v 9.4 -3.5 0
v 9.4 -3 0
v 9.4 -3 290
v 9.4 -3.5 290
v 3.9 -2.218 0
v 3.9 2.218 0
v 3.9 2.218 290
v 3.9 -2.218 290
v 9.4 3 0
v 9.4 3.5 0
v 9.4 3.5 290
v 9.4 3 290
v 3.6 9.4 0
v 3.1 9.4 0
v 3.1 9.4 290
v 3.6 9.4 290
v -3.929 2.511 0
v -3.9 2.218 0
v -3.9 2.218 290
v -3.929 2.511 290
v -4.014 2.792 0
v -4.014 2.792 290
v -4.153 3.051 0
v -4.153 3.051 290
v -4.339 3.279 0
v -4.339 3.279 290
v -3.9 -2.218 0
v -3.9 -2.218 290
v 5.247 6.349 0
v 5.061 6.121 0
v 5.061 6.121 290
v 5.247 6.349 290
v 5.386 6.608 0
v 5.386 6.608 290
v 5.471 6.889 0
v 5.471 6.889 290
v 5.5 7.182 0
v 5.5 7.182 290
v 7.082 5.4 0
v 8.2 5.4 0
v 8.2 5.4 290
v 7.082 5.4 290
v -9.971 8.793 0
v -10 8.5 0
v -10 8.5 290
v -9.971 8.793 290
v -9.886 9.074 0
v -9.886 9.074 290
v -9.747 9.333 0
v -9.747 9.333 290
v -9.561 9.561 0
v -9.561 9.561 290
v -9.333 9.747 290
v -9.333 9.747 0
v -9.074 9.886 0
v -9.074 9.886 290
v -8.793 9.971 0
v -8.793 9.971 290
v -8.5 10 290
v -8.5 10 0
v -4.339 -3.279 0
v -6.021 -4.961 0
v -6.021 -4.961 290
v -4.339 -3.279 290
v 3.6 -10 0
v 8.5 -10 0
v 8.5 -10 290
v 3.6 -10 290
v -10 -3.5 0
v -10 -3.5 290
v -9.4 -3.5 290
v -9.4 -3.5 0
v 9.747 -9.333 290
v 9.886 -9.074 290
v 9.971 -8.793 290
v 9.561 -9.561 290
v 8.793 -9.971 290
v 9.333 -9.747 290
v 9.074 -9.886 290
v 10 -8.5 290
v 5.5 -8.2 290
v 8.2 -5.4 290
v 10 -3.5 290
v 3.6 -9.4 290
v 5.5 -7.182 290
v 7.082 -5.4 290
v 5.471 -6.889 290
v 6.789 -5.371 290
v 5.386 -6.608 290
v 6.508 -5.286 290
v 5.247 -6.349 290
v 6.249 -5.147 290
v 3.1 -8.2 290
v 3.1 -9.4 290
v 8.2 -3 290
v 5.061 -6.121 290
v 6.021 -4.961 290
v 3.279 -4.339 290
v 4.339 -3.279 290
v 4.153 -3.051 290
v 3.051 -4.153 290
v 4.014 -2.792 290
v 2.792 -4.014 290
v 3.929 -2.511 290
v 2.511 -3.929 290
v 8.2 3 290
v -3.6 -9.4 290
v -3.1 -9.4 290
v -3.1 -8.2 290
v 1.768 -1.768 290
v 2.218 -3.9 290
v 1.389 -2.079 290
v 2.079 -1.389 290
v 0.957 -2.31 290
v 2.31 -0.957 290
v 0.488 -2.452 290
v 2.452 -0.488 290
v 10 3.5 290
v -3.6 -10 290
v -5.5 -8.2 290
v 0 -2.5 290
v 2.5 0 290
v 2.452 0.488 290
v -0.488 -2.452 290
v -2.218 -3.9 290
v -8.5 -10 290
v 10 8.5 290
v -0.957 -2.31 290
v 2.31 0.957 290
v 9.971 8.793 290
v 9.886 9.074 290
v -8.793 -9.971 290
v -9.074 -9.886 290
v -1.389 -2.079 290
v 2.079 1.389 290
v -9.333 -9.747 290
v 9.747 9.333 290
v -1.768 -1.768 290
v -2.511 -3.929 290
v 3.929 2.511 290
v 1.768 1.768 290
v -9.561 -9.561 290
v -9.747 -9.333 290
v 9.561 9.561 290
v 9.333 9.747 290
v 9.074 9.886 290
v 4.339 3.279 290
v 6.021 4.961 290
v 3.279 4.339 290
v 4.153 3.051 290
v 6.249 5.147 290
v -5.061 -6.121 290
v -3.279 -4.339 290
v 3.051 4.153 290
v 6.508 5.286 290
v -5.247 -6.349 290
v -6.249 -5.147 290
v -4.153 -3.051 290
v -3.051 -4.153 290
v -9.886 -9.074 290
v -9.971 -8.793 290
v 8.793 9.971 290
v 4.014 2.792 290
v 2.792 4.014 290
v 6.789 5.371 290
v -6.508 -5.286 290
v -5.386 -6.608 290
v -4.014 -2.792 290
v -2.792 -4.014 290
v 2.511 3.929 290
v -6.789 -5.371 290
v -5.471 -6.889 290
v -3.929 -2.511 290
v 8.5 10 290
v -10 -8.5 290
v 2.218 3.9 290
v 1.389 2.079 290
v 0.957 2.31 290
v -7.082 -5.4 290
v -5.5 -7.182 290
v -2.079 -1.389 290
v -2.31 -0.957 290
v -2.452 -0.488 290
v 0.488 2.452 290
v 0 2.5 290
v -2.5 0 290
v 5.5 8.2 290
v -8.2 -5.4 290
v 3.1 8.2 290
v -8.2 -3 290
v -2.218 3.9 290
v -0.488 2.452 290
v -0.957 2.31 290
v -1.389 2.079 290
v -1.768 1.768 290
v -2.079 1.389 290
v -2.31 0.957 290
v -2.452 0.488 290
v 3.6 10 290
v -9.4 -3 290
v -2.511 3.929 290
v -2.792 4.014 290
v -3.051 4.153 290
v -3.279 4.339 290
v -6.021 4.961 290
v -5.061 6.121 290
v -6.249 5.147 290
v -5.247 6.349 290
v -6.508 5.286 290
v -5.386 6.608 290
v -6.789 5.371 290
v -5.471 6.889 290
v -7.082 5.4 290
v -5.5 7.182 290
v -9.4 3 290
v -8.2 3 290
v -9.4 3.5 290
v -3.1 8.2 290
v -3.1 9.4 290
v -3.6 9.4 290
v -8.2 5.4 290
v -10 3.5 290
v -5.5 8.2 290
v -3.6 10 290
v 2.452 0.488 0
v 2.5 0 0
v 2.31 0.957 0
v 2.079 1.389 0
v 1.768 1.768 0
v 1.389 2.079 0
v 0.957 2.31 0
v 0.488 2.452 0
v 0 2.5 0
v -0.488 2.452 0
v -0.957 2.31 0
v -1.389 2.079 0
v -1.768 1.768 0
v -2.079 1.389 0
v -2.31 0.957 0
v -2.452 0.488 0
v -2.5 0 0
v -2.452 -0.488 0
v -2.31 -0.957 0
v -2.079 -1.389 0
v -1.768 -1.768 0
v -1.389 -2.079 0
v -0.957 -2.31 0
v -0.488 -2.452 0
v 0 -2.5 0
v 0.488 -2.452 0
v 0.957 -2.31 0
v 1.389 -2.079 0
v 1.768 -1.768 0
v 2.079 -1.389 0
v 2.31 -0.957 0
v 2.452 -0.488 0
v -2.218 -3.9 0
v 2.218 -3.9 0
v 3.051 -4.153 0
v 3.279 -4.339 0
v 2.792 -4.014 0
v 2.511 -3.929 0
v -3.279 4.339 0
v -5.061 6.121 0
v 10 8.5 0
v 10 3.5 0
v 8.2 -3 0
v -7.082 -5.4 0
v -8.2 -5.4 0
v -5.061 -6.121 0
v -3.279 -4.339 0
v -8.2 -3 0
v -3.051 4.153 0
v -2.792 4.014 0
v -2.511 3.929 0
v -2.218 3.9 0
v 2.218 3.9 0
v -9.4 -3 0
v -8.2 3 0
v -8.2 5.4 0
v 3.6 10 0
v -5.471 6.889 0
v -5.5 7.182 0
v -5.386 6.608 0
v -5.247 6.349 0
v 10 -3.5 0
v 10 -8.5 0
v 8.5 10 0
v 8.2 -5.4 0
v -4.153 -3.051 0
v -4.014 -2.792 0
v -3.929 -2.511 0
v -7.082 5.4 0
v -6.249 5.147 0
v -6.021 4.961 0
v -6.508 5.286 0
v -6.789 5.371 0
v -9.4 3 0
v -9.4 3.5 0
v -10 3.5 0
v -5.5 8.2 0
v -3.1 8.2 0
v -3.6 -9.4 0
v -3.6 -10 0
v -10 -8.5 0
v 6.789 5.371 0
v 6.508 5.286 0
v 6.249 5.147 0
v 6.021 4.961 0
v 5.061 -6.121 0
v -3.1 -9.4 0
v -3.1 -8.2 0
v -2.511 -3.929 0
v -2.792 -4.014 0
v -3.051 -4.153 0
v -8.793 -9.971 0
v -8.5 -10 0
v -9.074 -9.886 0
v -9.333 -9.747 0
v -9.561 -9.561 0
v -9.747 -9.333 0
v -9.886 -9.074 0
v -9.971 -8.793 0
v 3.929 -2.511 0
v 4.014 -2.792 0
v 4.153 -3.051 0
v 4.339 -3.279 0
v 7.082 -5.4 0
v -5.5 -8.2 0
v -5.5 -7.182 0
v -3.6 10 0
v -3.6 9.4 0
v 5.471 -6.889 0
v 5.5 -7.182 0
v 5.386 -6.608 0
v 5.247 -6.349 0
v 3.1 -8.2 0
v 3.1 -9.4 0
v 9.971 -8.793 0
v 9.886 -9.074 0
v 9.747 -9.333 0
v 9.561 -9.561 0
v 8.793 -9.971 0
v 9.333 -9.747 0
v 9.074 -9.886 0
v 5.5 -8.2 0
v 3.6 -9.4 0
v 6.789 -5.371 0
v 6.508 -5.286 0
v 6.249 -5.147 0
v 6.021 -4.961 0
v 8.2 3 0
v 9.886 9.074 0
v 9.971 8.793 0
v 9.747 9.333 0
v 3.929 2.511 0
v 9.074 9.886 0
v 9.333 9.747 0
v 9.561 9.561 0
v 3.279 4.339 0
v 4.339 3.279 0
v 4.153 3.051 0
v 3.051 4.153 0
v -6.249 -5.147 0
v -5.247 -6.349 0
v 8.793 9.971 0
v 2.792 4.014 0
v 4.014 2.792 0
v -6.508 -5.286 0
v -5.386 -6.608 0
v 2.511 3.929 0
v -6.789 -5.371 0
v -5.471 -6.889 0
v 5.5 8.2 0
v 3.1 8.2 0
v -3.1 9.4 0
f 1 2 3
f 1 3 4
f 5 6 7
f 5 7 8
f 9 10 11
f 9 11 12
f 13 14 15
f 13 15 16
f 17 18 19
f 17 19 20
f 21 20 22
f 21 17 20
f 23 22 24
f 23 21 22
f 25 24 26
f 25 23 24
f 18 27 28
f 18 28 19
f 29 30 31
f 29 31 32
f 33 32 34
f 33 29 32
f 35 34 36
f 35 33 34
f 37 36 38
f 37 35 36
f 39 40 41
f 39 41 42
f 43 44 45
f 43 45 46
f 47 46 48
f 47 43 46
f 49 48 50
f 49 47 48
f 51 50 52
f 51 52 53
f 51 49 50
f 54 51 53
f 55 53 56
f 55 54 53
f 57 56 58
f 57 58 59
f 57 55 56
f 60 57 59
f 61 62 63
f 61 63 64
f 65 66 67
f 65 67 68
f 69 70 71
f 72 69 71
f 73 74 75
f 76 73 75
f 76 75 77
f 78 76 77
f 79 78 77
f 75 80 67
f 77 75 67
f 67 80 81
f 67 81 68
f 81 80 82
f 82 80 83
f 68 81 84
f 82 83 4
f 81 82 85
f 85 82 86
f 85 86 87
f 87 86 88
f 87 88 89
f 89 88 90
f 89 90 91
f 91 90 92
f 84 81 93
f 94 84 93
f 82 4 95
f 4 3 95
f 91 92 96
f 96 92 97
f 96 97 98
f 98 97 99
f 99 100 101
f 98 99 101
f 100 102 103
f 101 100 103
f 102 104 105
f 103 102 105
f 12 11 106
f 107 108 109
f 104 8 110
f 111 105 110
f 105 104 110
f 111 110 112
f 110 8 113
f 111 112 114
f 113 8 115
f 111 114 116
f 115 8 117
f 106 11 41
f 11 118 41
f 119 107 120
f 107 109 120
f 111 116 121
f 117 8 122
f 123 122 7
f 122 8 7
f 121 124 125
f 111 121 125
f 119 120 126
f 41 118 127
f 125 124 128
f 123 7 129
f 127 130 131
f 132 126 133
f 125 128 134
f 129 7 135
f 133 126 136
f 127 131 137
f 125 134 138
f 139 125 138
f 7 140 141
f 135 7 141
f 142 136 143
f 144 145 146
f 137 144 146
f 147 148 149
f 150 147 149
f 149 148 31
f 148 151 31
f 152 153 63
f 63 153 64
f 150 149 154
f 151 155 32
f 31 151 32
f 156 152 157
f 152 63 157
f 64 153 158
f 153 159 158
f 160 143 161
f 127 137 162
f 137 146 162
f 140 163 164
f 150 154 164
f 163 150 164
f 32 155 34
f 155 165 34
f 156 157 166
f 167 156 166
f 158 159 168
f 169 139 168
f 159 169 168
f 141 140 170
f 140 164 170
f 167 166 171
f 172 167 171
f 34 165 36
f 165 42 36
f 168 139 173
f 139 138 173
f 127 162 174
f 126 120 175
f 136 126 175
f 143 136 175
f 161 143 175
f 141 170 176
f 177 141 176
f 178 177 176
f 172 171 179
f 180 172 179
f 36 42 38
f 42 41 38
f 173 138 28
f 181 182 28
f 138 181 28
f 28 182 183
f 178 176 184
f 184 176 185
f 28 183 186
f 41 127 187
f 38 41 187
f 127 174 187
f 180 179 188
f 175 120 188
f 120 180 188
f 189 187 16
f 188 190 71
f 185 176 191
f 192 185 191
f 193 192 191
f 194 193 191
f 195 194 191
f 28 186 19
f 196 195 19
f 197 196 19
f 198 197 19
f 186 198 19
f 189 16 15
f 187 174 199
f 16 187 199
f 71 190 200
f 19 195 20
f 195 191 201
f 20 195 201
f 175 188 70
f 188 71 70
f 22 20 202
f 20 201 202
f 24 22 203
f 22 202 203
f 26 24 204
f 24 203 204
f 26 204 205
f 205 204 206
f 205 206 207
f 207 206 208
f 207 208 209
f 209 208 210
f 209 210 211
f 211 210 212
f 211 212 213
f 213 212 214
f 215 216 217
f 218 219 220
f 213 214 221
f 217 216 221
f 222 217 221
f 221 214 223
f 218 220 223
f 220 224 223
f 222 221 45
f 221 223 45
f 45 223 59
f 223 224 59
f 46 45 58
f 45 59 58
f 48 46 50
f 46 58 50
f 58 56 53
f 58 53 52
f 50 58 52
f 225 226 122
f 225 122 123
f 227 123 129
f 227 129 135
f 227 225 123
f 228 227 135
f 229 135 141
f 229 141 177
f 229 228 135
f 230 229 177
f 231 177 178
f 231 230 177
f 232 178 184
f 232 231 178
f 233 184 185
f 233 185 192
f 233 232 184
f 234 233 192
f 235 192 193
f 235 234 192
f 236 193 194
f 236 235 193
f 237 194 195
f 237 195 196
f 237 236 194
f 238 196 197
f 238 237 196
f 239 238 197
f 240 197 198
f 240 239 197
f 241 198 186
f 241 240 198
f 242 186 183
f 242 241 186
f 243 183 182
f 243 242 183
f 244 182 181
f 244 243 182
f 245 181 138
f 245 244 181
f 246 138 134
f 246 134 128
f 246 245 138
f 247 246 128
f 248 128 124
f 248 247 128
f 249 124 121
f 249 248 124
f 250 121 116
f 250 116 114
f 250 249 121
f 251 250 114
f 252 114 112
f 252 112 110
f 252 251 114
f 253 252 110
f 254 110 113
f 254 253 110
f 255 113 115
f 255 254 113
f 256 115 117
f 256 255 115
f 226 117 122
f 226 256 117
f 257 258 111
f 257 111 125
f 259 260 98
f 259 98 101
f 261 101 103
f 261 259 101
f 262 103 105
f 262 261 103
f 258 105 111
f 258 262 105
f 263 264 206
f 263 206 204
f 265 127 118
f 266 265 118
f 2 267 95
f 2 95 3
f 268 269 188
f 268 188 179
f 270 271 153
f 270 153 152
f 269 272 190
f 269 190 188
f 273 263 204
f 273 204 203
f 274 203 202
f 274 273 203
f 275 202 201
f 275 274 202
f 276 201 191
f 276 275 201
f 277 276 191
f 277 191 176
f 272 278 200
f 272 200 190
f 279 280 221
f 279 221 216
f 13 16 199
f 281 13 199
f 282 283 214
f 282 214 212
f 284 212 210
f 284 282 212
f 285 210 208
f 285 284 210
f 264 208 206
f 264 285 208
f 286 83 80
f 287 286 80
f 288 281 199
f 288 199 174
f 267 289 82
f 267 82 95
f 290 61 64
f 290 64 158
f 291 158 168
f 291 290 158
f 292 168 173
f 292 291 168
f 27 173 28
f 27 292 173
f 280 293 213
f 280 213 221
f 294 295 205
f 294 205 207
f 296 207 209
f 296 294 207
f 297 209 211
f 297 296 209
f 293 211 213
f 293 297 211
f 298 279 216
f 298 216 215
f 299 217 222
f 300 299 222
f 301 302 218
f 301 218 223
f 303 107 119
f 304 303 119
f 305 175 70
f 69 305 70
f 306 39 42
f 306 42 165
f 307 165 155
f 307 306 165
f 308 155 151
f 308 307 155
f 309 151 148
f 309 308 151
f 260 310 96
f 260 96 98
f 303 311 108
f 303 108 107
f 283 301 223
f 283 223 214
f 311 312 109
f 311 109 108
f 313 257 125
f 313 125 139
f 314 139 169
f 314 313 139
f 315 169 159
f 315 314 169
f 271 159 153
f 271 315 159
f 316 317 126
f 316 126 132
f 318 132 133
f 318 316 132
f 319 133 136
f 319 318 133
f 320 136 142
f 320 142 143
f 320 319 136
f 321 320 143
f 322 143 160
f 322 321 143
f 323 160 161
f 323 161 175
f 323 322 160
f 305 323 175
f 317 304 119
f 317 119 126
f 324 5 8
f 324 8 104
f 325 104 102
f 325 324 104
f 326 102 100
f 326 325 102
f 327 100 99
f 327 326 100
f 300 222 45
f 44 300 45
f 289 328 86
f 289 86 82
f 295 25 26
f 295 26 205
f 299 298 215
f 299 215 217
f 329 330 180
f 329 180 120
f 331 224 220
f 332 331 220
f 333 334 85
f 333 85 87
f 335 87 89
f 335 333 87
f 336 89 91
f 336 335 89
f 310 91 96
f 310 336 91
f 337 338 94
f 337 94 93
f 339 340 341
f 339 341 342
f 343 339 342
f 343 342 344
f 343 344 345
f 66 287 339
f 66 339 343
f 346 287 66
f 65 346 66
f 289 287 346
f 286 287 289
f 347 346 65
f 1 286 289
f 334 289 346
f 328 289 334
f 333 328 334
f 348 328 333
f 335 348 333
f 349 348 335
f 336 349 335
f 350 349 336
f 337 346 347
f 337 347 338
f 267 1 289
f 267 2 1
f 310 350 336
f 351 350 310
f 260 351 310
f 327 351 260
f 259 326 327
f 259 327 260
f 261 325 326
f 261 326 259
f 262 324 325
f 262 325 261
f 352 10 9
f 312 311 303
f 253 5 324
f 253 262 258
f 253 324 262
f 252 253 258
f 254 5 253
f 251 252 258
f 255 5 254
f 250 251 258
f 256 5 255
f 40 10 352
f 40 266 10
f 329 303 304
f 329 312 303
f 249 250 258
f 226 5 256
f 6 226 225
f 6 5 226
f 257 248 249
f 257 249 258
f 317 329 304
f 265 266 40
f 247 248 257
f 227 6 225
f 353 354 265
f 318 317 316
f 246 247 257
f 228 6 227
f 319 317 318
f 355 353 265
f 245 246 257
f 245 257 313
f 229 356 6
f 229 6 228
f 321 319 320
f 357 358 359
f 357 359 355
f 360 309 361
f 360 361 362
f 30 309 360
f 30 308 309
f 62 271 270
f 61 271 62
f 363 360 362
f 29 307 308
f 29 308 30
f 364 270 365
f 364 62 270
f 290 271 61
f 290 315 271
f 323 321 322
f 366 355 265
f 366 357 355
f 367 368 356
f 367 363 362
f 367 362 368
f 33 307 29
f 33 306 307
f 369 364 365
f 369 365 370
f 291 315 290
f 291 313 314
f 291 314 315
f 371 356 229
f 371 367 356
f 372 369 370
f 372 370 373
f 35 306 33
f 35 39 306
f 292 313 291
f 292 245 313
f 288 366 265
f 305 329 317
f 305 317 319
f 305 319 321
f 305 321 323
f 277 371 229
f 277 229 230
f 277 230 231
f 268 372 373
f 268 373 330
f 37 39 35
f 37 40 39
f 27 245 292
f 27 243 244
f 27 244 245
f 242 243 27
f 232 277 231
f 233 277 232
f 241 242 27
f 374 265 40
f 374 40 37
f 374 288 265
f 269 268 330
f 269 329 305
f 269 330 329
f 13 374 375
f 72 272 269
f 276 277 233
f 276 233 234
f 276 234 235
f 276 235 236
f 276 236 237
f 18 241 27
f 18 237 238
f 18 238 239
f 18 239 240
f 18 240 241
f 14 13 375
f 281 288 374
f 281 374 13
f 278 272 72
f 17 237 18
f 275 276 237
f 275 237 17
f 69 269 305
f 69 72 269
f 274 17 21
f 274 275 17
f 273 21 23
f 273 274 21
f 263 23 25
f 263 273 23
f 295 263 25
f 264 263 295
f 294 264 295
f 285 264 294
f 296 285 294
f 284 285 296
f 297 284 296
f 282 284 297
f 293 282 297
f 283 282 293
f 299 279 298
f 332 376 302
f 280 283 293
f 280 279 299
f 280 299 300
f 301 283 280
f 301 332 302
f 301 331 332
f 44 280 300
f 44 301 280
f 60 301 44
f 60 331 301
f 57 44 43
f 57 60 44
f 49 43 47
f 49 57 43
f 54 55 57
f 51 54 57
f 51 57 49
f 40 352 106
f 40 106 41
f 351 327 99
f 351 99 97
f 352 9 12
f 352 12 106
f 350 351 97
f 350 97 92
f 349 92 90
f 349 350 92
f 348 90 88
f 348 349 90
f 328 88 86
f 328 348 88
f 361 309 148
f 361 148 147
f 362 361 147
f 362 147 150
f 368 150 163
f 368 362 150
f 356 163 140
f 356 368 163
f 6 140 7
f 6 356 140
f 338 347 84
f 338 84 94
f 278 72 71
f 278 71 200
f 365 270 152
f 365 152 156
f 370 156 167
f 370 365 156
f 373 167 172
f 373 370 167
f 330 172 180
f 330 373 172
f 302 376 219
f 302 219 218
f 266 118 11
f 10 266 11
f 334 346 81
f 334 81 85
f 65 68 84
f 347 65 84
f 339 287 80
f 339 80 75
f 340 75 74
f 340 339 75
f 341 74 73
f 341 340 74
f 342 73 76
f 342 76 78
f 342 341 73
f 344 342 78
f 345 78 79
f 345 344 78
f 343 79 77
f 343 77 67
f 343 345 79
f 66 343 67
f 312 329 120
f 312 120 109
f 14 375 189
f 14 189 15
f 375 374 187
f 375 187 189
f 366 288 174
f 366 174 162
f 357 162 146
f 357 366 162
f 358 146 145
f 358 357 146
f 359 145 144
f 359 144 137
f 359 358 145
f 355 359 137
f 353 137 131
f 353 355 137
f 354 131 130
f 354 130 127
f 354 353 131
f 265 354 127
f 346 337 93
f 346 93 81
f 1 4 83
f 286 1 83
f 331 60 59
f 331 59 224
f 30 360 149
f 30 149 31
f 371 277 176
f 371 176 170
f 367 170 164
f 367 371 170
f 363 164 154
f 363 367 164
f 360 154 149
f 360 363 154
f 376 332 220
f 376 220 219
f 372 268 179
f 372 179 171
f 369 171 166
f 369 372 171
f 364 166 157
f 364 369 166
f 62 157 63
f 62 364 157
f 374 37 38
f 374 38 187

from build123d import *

# Parameters (mm, degrees)
SKETCH1_R           = 2.5
BOSS_EXTRUDE1_DEPTH = 290


with BuildPart() as part:
    # Sketch1 → Boss-Extrude1 (new body)
    with BuildSketch(Plane.XY):
        with BuildLine():
            Line((-3.6, -10), (-8.5, -10))
            ThreePointArc((-8.5, -10), (-9.560660172, -9.560660172), (-10, -8.5))
            Line((-10, -8.5), (-10, -3.5))
            Line((-10, -3.5), (-9.4, -3.5))
            Line((-9.4, -3.5), (-9.4, -3))
            Line((-9.4, -3), (-8.2, -3))
            Line((-8.2, -3), (-8.2, -5.4))
            Line((-8.2, -5.4), (-7.081980515, -5.4))
            ThreePointArc((-7.081980515, -5.4), (-6.507955367, -5.285819299), (-6.021320344, -4.960660172))
            Line((-6.021320344, -4.960660172), (-4.339339828, -3.278679656))
            ThreePointArc((-4.339339828, -3.278679656), (-4.014180701, -2.792044633), (-3.9, -2.218019485))
            Line((-3.9, -2.218019485), (-3.9, 2.218019485))
            ThreePointArc((-3.9, 2.218019485), (-4.014180701, 2.792044633), (-4.339339828, 3.278679656))
            Line((-4.339339828, 3.278679656), (-6.021320344, 4.960660172))
            ThreePointArc((-6.021320344, 4.960660172), (-6.507955367, 5.285819299), (-7.081980515, 5.4))
            Line((-7.081980515, 5.4), (-8.2, 5.4))
            Line((-8.2, 5.4), (-8.2, 3))
            Line((-8.2, 3), (-9.4, 3))
            Line((-9.4, 3), (-9.4, 3.5))
            Line((-9.4, 3.5), (-10, 3.5))
            Line((-10, 3.5), (-10, 8.5))
            ThreePointArc((-10, 8.5), (-9.560660172, 9.560660172), (-8.5, 10))
            Line((-8.5, 10), (-3.6, 10))
            Line((-3.6, 10), (-3.6, 9.4))
            Line((-3.6, 9.4), (-3.1, 9.4))
            Line((-3.1, 9.4), (-3.1, 8.2))
            Line((-3.1, 8.2), (-5.5, 8.2))
            Line((-5.5, 8.2), (-5.5, 7.181980515))
            ThreePointArc((-5.5, 7.181980515), (-5.385819299, 6.607955367), (-5.060660172, 6.121320344))
            Line((-5.060660172, 6.121320344), (-3.278679656, 4.339339828))
            ThreePointArc((-3.278679656, 4.339339828), (-2.792044633, 4.014180701), (-2.218019485, 3.9))
            Line((-2.218019485, 3.9), (2.218019485, 3.9))
            ThreePointArc((2.218019485, 3.9), (2.792044633, 4.014180701), (3.278679656, 4.339339828))
            Line((3.278679656, 4.339339828), (5.060660172, 6.121320344))
            ThreePointArc((5.060660172, 6.121320344), (5.385819299, 6.607955367), (5.5, 7.181980515))
            Line((5.5, 7.181980515), (5.5, 8.2))
            Line((5.5, 8.2), (3.1, 8.2))
            Line((3.1, 8.2), (3.1, 9.4))
            Line((3.1, 9.4), (3.6, 9.4))
            Line((3.6, 9.4), (3.6, 10))
            Line((3.6, 10), (8.5, 10))
            ThreePointArc((8.5, 10), (9.560660172, 9.560660172), (10, 8.5))
            Line((10, 8.5), (10, 3.5))
            Line((10, 3.5), (9.4, 3.5))
            Line((9.4, 3.5), (9.4, 3))
            Line((9.4, 3), (8.2, 3))
            Line((8.2, 3), (8.2, 5.4))
            Line((8.2, 5.4), (7.081980515, 5.4))
            ThreePointArc((7.081980515, 5.4), (6.507955367, 5.285819299), (6.021320344, 4.960660172))
            Line((6.021320344, 4.960660172), (4.339339828, 3.278679656))
            ThreePointArc((4.339339828, 3.278679656), (4.014180701, 2.792044633), (3.9, 2.218019485))
            Line((3.9, 2.218019485), (3.9, -2.218019485))
            ThreePointArc((3.9, -2.218019485), (4.014180701, -2.792044633), (4.339339828, -3.278679656))
            Line((4.339339828, -3.278679656), (6.021320344, -4.960660172))
            ThreePointArc((6.021320344, -4.960660172), (6.507955367, -5.285819299), (7.081980515, -5.4))
            Line((7.081980515, -5.4), (8.2, -5.4))
            Line((8.2, -5.4), (8.2, -3))
            Line((8.2, -3), (9.4, -3))
            Line((9.4, -3), (9.4, -3.5))
            Line((9.4, -3.5), (10, -3.5))
            Line((10, -3.5), (10, -8.5))
            ThreePointArc((10, -8.5), (9.560660172, -9.560660172), (8.5, -10))
            Line((8.5, -10), (3.6, -10))
            Line((3.6, -10), (3.6, -9.4))
            Line((3.6, -9.4), (3.1, -9.4))
            Line((3.1, -9.4), (3.1, -8.2))
            Line((3.1, -8.2), (5.5, -8.2))
            Line((5.5, -8.2), (5.5, -7.181980515))
            ThreePointArc((5.5, -7.181980515), (5.385819299, -6.607955367), (5.060660172, -6.121320344))
            Line((5.060660172, -6.121320344), (3.278679656, -4.339339828))
            ThreePointArc((3.278679656, -4.339339828), (2.792044633, -4.014180701), (2.218019485, -3.9))
            Line((2.218019485, -3.9), (-2.218019485, -3.9))
            ThreePointArc((-2.218019485, -3.9), (-2.792044633, -4.014180701), (-3.278679656, -4.339339828))
            Line((-3.278679656, -4.339339828), (-5.060660172, -6.121320344))
            ThreePointArc((-5.060660172, -6.121320344), (-5.385819299, -6.607955367), (-5.5, -7.181980515))
            Line((-5.5, -7.181980515), (-5.5, -8.2))
            Line((-5.5, -8.2), (-3.1, -8.2))
            Line((-3.1, -8.2), (-3.1, -9.4))
            Line((-3.1, -9.4), (-3.6, -9.4))
            Line((-3.6, -9.4), (-3.6, -10))
        make_face()
        Circle(SKETCH1_R, mode=Mode.SUBTRACT)
    extrude(amount=BOSS_EXTRUDE1_DEPTH)


solid = part.part
